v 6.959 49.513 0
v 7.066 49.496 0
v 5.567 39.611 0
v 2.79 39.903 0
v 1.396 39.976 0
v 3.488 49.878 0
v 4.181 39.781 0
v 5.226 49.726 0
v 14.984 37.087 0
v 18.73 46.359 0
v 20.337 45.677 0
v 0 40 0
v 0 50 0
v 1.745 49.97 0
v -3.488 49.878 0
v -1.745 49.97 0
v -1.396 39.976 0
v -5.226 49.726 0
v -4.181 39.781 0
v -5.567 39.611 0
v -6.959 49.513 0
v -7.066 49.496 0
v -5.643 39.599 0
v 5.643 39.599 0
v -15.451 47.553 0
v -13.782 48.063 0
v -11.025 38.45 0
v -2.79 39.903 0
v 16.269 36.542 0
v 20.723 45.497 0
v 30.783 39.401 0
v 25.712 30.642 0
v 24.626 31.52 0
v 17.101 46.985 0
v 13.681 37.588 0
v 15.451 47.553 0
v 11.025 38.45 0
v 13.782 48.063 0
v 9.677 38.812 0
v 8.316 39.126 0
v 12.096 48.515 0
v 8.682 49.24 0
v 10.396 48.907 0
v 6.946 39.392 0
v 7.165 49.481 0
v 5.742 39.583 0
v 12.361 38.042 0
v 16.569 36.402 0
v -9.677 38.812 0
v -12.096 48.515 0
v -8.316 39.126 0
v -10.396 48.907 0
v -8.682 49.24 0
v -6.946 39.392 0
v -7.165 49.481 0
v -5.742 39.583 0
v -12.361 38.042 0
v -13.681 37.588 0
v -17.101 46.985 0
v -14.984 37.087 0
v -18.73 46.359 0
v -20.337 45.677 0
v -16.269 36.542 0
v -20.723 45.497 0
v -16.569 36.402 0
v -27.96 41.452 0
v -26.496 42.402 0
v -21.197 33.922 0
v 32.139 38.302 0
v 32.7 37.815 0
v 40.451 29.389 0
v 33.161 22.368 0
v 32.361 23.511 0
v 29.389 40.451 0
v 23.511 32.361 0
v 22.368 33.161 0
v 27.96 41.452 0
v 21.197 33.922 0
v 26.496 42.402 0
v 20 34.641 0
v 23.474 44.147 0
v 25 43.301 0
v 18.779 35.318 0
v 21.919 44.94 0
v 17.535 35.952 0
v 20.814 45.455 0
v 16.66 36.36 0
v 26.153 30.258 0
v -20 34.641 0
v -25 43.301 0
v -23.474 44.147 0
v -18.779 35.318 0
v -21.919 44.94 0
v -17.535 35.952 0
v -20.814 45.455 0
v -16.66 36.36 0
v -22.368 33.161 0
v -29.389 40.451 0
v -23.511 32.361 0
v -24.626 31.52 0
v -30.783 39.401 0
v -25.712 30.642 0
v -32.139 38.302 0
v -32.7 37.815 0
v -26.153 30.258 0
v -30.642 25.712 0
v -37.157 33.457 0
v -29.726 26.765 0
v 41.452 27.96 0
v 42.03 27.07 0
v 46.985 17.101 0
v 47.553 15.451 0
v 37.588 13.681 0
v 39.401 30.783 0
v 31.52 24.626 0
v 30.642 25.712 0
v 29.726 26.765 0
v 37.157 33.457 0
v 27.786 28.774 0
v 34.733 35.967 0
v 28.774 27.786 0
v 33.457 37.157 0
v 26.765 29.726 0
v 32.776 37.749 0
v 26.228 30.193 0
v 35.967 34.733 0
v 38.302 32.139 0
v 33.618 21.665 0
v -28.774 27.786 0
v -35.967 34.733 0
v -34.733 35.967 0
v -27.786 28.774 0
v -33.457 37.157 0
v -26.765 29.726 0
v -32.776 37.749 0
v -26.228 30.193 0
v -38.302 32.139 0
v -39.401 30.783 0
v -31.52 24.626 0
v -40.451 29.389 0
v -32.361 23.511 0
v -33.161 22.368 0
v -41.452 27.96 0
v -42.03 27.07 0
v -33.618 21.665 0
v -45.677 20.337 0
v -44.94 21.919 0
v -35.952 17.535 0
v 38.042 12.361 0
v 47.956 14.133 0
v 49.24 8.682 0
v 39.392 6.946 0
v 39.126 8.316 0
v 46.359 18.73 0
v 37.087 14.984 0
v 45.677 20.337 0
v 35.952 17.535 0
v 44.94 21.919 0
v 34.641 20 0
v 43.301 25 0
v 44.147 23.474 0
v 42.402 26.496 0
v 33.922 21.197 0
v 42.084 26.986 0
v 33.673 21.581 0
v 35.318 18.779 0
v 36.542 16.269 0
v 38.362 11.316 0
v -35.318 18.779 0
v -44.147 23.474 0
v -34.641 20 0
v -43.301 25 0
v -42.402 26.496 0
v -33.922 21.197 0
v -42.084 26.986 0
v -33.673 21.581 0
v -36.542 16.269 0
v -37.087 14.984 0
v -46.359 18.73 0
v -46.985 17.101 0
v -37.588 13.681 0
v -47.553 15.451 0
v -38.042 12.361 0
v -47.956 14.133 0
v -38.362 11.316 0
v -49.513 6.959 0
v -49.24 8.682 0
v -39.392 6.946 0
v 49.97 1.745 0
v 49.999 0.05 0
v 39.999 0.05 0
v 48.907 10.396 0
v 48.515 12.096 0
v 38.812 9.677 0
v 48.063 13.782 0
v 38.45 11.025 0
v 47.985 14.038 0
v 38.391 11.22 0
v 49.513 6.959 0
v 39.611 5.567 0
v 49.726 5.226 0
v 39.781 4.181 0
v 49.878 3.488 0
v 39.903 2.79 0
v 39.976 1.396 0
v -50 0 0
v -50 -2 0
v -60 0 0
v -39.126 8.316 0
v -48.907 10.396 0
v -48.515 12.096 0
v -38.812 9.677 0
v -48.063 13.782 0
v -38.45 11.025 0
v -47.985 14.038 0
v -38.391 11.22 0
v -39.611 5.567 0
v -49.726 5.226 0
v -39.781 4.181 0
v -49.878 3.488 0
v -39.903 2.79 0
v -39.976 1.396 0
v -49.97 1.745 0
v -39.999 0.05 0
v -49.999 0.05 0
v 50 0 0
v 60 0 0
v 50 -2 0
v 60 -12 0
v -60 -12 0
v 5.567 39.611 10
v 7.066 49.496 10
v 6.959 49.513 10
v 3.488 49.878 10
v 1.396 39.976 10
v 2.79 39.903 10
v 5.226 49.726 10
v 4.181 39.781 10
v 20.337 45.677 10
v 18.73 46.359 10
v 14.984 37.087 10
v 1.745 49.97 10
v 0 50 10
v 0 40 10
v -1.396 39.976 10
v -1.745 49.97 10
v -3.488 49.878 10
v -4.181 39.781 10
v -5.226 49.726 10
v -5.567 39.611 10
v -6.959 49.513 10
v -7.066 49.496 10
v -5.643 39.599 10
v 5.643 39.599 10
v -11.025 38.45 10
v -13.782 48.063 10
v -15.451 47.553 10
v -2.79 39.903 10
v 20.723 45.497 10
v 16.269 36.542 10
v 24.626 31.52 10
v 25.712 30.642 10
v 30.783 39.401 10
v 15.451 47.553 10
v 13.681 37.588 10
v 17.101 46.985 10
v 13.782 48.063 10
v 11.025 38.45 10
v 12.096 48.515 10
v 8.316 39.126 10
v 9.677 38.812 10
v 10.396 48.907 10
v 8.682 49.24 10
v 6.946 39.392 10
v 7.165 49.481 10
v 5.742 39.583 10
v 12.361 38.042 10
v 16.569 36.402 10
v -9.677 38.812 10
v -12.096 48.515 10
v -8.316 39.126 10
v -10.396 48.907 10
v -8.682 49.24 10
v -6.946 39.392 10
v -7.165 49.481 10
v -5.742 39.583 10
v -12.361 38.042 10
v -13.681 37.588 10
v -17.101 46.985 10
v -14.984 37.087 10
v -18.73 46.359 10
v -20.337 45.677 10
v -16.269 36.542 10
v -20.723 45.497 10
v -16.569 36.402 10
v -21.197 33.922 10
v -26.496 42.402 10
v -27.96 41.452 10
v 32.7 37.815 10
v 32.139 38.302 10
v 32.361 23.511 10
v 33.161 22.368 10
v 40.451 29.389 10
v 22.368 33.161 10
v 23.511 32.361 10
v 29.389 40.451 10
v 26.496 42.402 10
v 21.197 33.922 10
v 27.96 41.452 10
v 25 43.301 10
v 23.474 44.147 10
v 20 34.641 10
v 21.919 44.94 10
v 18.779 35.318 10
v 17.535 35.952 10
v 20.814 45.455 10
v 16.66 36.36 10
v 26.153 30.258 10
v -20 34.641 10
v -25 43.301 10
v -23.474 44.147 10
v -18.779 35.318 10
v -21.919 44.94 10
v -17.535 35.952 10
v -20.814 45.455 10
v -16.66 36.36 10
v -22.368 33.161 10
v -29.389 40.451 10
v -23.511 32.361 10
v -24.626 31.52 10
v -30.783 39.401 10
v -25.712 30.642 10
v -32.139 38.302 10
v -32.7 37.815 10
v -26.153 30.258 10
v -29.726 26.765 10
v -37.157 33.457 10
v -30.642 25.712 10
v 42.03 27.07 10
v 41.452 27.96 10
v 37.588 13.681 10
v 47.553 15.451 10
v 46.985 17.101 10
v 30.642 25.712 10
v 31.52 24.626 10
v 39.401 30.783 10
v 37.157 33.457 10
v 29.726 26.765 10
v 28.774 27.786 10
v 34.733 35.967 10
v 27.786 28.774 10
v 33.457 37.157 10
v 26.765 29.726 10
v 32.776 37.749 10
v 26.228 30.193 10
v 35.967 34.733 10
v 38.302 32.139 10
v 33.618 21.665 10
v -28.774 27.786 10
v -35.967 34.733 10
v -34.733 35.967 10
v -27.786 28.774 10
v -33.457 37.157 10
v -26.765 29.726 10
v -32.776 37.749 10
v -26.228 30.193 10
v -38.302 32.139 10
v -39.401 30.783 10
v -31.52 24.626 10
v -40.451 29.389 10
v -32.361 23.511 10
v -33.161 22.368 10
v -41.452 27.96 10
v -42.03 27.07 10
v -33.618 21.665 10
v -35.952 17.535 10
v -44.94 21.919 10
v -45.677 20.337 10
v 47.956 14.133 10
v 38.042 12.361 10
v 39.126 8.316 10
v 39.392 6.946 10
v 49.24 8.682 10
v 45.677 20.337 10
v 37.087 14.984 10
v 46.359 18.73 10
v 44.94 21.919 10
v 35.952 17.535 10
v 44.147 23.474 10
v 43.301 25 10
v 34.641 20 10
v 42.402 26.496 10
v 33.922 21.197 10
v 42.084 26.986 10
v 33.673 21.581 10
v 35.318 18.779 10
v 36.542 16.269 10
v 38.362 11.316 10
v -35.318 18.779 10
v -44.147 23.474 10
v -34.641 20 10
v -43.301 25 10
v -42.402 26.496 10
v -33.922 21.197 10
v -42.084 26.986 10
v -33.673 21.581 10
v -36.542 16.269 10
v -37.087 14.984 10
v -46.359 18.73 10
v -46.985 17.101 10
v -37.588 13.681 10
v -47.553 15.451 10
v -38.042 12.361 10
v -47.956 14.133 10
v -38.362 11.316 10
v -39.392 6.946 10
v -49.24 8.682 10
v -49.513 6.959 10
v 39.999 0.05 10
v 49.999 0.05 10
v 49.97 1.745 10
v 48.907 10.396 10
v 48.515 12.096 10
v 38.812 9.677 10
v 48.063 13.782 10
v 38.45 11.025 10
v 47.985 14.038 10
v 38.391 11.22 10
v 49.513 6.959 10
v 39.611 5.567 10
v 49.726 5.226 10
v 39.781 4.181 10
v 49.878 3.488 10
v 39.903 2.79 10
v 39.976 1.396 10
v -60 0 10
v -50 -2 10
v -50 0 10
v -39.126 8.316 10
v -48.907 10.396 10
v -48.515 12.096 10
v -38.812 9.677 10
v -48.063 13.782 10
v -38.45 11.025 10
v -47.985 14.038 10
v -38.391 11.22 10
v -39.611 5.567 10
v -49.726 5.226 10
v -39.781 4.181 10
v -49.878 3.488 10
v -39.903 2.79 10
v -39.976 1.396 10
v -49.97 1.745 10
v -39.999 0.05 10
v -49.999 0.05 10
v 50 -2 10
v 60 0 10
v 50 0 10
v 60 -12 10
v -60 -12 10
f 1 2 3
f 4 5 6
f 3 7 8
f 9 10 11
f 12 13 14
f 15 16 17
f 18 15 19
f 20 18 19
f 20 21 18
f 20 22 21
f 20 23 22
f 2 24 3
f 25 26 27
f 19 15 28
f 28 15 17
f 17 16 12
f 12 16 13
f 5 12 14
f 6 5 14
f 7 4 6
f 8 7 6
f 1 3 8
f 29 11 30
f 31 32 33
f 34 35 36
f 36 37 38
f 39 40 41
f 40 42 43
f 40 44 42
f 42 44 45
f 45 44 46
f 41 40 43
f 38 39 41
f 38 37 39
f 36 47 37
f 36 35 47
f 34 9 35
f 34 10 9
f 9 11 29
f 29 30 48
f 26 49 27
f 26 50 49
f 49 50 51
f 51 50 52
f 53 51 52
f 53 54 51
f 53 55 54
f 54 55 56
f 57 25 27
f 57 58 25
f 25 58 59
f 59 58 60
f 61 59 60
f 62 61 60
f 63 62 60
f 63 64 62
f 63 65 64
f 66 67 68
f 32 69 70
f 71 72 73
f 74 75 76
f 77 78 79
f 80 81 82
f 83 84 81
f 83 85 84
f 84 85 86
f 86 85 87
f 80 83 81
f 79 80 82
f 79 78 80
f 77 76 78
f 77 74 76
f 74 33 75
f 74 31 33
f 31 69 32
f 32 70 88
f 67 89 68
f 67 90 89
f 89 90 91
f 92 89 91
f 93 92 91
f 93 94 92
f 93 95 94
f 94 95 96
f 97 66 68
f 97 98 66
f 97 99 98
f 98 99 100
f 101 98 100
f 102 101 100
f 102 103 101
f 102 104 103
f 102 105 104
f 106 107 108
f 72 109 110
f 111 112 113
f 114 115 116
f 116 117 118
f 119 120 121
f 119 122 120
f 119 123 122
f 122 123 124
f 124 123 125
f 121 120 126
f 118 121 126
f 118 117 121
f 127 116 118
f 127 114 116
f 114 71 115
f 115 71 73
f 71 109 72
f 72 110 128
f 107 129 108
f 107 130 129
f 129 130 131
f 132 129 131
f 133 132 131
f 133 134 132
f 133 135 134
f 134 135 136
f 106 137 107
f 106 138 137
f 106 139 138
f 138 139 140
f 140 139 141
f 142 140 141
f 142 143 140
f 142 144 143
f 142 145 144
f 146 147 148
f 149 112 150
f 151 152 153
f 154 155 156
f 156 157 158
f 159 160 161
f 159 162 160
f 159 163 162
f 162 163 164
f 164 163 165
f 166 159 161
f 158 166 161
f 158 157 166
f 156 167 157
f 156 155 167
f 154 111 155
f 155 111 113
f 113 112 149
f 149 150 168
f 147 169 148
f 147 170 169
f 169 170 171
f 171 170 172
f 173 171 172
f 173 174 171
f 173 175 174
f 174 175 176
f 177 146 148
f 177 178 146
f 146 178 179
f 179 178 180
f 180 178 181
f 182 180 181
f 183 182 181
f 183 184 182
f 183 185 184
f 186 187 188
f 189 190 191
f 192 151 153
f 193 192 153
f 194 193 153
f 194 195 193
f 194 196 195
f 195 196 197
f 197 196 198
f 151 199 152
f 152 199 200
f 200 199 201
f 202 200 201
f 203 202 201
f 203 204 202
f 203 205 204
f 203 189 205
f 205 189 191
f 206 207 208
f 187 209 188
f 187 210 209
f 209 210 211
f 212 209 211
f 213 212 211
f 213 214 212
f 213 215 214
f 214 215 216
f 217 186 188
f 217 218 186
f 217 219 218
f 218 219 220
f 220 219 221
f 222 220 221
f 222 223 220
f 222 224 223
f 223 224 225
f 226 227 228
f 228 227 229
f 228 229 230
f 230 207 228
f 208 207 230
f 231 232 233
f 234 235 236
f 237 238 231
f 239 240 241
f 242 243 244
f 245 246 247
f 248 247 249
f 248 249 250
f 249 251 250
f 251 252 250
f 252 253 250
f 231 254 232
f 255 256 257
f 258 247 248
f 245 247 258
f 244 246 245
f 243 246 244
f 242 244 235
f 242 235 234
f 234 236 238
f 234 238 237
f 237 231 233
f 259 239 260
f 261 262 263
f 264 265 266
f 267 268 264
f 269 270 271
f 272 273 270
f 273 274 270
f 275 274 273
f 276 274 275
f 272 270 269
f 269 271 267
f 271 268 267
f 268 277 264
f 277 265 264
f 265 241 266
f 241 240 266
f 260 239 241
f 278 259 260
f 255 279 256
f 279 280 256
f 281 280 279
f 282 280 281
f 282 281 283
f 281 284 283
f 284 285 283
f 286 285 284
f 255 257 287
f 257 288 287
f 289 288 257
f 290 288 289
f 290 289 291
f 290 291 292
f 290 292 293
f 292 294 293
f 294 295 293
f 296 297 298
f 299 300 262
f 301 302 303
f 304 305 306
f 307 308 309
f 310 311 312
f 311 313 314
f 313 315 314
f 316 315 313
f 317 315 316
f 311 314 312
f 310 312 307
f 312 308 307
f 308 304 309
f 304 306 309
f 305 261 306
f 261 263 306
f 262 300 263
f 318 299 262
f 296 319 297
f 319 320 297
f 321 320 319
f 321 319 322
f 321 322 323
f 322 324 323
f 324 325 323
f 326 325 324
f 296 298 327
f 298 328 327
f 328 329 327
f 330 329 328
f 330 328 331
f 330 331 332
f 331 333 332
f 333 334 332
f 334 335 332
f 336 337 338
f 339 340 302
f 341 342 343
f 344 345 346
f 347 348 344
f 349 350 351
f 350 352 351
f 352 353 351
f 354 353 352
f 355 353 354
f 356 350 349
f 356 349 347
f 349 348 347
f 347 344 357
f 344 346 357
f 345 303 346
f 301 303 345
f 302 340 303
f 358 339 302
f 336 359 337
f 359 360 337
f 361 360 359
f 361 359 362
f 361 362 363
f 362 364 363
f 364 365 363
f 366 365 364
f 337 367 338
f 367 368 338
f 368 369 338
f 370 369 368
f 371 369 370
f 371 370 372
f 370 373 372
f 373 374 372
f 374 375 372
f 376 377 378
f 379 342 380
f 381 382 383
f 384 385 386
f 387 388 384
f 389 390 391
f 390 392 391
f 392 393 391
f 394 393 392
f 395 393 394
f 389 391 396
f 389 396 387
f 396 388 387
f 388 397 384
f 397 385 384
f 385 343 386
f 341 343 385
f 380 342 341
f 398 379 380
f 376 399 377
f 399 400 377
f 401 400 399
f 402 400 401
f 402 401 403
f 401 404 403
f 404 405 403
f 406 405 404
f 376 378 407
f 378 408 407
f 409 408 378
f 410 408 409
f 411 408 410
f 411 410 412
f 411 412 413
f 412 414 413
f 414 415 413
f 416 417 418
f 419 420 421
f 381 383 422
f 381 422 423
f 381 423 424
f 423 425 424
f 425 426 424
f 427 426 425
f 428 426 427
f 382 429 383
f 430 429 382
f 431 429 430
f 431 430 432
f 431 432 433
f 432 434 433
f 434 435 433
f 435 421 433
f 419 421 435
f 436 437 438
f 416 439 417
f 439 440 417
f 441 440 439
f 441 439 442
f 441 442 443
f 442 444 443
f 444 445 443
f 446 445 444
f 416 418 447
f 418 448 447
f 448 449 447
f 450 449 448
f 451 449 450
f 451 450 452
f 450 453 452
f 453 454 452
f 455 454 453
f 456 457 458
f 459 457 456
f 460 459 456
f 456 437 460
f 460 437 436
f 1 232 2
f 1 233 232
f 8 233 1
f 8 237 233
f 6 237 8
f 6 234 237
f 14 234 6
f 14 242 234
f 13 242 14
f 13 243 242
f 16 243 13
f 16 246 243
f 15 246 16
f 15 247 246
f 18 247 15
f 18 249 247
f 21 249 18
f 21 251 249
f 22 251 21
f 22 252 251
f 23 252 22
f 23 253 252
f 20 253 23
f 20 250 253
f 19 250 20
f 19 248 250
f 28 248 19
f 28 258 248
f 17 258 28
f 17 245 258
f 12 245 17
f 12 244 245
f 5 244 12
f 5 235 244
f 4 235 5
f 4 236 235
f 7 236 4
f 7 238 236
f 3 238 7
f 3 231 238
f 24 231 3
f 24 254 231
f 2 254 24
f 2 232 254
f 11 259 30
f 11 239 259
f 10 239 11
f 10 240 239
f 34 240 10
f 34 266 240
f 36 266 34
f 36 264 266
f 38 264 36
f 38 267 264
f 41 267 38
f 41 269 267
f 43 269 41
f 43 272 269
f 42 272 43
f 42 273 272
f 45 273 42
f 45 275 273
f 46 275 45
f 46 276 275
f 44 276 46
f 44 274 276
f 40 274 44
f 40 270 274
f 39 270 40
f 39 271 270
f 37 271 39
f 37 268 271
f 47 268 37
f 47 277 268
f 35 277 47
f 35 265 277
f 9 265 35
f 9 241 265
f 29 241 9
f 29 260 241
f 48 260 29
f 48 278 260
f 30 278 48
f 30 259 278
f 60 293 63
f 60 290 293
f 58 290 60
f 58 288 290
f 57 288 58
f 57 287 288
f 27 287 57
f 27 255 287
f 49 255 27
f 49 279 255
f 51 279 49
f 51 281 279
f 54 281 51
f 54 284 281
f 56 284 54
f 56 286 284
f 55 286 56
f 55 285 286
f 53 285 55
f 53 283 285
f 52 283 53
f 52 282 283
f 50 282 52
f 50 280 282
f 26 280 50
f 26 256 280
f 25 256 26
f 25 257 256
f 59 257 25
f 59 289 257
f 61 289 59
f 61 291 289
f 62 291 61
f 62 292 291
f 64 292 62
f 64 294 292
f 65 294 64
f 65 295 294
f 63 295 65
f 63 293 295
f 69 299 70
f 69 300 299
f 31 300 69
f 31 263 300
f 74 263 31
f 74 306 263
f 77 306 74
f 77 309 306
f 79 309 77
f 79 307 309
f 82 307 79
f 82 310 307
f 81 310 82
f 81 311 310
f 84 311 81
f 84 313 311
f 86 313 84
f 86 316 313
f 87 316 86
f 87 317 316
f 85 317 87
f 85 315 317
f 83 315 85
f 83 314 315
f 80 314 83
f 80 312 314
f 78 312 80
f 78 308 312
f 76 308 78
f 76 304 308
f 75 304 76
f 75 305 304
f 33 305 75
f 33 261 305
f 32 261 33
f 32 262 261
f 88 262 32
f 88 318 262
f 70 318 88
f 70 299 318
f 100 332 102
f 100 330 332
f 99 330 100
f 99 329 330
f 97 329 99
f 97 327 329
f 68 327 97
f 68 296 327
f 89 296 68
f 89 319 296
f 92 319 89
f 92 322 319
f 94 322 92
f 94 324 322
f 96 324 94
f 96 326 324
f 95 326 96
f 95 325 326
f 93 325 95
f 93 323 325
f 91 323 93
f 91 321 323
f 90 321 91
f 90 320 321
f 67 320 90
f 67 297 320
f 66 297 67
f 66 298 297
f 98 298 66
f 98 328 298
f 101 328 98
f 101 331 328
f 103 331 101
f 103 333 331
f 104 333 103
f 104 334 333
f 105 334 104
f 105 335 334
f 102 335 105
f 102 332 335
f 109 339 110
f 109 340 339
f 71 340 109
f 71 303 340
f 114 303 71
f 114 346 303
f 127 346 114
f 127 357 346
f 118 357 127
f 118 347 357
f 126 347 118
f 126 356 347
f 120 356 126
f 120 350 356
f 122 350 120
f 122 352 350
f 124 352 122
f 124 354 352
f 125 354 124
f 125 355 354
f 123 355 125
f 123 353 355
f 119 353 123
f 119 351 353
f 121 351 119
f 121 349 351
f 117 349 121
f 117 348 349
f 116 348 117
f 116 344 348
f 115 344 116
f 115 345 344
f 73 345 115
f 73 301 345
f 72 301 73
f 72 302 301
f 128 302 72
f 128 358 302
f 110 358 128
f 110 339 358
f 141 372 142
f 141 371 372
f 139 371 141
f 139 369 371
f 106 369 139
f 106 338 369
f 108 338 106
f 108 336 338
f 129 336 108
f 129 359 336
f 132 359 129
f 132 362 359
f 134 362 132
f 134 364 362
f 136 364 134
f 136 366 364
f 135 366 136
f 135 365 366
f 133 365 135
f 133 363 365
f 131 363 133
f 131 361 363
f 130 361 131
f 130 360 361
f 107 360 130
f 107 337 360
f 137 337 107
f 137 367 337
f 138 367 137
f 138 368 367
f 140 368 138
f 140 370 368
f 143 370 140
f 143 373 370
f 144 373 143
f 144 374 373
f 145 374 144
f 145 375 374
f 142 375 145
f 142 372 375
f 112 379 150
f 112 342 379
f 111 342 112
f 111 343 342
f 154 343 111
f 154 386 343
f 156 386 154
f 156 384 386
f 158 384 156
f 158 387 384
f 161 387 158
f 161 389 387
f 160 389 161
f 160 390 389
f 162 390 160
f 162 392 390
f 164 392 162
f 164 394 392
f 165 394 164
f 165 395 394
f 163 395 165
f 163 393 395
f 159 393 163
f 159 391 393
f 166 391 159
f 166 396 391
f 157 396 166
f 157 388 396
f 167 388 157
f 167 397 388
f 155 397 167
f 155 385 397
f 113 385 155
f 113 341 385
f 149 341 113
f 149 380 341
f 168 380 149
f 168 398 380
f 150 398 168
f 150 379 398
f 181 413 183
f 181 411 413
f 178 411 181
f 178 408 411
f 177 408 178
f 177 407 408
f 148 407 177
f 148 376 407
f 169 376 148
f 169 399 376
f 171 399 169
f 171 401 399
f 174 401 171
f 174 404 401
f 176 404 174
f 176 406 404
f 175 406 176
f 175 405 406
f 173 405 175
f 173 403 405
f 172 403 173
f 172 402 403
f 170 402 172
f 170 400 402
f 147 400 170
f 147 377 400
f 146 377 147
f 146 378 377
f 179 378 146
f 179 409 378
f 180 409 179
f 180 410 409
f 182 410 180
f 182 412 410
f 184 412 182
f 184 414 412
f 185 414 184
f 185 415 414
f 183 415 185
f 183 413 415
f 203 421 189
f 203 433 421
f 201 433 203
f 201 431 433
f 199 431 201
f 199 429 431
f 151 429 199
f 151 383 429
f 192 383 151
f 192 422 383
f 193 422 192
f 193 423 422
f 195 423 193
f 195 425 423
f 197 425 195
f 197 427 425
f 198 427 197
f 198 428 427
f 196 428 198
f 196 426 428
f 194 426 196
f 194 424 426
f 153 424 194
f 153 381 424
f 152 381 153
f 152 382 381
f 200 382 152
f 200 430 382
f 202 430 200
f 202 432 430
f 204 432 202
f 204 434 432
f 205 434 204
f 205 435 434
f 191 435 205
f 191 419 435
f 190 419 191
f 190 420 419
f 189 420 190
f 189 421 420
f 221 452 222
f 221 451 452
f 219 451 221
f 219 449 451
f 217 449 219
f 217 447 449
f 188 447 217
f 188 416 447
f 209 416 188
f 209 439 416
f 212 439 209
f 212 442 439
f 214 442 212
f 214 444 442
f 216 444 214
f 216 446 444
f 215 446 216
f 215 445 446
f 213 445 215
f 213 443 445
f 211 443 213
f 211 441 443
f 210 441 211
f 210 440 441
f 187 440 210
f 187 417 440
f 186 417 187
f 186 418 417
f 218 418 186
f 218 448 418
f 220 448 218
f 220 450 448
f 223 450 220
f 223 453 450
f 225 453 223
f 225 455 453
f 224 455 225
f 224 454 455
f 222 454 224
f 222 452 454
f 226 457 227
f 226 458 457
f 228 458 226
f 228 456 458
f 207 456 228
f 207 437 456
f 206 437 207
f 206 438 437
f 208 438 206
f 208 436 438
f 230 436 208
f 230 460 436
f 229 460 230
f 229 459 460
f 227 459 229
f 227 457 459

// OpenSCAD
// file arches.scad
// Creates Gothic or circular arches, made up of smaller "stones
// (c) 2020 Rich Cameron
// released under a Creative Commons CC-BY 4.0 International License

size = 80; //diameter of the arch opening at the base, mm
w = 10; //width of the bricks that make the arch, mm
thick = w; //height of the print, set to 0 for 2D printing on paper
segments = 11; // Number of stones; use 10.01 for a small keystone (the stone on top of a Gothic arch)
gap = 0.1; //Gap between stones (to leave space for mortar, for example), mm
separate = 0; //Extra spacing between the stones for printing (to ensure that they don't stick together).

gothic = false; //Make this true to print a Gothic arch, false for a circular one 

$fs = .2;
$fa = 2;
	

if(thick) linear_extrude(thick) {
	arch();
} else {
	arch();
}


module arch() {
	if(gothic) for(i = [0:segments / 2 - .0001], j = [0, 1]) mirror([j, 0, 0]) translate([separate * (floor((segments / 2 - .0001)) - i), separate * i, 0]) intersection() {
		difference() {
			translate([-size / 2, 0, 0]) circle(size + w);
			translate([-size / 2, 0, 0]) circle(size);
		}
		square(size + w);
		if(segments > 1) offset(-gap / 2) translate([-size / 2, 0, 0]) rotate(120 / segments * i) intersection() {
			square(size + w * 2);
			if((segments % 2) || (i < (segments / 2 - 1))) rotate(-90 + 120 / segments) square(size + w * 2);
			else rotate(-120 / segments * i) translate([size / 2, 0, 0]) square(size + w);
		}
	} else for(i = [0:segments / 2 - .0001], j = [0, 1]) mirror([j, 0, 0]) translate([separate * (floor((segments / 2 - .0001)) - i), separate * i, 0])intersection() {
		difference() {
			circle(size / 2 + w);
			circle(size / 2);
		}
		square(size + w);
		if(segments > 1) offset(-gap / 2) rotate(180 / segments * i) intersection() {
			square(size + w);
			rotate(-90 + 180 / segments) square(size + w);
		}
	}
	
	translate([0, -2 - separate, 0]) difference() {
		translate([-size / 2 - w * 2, -w, 0]) square([size + w * 4, w + 2]);
		translate([-size / 2 - w * 1, 0, 0]) square([size + w * 2, w + 2]);
	}
}
